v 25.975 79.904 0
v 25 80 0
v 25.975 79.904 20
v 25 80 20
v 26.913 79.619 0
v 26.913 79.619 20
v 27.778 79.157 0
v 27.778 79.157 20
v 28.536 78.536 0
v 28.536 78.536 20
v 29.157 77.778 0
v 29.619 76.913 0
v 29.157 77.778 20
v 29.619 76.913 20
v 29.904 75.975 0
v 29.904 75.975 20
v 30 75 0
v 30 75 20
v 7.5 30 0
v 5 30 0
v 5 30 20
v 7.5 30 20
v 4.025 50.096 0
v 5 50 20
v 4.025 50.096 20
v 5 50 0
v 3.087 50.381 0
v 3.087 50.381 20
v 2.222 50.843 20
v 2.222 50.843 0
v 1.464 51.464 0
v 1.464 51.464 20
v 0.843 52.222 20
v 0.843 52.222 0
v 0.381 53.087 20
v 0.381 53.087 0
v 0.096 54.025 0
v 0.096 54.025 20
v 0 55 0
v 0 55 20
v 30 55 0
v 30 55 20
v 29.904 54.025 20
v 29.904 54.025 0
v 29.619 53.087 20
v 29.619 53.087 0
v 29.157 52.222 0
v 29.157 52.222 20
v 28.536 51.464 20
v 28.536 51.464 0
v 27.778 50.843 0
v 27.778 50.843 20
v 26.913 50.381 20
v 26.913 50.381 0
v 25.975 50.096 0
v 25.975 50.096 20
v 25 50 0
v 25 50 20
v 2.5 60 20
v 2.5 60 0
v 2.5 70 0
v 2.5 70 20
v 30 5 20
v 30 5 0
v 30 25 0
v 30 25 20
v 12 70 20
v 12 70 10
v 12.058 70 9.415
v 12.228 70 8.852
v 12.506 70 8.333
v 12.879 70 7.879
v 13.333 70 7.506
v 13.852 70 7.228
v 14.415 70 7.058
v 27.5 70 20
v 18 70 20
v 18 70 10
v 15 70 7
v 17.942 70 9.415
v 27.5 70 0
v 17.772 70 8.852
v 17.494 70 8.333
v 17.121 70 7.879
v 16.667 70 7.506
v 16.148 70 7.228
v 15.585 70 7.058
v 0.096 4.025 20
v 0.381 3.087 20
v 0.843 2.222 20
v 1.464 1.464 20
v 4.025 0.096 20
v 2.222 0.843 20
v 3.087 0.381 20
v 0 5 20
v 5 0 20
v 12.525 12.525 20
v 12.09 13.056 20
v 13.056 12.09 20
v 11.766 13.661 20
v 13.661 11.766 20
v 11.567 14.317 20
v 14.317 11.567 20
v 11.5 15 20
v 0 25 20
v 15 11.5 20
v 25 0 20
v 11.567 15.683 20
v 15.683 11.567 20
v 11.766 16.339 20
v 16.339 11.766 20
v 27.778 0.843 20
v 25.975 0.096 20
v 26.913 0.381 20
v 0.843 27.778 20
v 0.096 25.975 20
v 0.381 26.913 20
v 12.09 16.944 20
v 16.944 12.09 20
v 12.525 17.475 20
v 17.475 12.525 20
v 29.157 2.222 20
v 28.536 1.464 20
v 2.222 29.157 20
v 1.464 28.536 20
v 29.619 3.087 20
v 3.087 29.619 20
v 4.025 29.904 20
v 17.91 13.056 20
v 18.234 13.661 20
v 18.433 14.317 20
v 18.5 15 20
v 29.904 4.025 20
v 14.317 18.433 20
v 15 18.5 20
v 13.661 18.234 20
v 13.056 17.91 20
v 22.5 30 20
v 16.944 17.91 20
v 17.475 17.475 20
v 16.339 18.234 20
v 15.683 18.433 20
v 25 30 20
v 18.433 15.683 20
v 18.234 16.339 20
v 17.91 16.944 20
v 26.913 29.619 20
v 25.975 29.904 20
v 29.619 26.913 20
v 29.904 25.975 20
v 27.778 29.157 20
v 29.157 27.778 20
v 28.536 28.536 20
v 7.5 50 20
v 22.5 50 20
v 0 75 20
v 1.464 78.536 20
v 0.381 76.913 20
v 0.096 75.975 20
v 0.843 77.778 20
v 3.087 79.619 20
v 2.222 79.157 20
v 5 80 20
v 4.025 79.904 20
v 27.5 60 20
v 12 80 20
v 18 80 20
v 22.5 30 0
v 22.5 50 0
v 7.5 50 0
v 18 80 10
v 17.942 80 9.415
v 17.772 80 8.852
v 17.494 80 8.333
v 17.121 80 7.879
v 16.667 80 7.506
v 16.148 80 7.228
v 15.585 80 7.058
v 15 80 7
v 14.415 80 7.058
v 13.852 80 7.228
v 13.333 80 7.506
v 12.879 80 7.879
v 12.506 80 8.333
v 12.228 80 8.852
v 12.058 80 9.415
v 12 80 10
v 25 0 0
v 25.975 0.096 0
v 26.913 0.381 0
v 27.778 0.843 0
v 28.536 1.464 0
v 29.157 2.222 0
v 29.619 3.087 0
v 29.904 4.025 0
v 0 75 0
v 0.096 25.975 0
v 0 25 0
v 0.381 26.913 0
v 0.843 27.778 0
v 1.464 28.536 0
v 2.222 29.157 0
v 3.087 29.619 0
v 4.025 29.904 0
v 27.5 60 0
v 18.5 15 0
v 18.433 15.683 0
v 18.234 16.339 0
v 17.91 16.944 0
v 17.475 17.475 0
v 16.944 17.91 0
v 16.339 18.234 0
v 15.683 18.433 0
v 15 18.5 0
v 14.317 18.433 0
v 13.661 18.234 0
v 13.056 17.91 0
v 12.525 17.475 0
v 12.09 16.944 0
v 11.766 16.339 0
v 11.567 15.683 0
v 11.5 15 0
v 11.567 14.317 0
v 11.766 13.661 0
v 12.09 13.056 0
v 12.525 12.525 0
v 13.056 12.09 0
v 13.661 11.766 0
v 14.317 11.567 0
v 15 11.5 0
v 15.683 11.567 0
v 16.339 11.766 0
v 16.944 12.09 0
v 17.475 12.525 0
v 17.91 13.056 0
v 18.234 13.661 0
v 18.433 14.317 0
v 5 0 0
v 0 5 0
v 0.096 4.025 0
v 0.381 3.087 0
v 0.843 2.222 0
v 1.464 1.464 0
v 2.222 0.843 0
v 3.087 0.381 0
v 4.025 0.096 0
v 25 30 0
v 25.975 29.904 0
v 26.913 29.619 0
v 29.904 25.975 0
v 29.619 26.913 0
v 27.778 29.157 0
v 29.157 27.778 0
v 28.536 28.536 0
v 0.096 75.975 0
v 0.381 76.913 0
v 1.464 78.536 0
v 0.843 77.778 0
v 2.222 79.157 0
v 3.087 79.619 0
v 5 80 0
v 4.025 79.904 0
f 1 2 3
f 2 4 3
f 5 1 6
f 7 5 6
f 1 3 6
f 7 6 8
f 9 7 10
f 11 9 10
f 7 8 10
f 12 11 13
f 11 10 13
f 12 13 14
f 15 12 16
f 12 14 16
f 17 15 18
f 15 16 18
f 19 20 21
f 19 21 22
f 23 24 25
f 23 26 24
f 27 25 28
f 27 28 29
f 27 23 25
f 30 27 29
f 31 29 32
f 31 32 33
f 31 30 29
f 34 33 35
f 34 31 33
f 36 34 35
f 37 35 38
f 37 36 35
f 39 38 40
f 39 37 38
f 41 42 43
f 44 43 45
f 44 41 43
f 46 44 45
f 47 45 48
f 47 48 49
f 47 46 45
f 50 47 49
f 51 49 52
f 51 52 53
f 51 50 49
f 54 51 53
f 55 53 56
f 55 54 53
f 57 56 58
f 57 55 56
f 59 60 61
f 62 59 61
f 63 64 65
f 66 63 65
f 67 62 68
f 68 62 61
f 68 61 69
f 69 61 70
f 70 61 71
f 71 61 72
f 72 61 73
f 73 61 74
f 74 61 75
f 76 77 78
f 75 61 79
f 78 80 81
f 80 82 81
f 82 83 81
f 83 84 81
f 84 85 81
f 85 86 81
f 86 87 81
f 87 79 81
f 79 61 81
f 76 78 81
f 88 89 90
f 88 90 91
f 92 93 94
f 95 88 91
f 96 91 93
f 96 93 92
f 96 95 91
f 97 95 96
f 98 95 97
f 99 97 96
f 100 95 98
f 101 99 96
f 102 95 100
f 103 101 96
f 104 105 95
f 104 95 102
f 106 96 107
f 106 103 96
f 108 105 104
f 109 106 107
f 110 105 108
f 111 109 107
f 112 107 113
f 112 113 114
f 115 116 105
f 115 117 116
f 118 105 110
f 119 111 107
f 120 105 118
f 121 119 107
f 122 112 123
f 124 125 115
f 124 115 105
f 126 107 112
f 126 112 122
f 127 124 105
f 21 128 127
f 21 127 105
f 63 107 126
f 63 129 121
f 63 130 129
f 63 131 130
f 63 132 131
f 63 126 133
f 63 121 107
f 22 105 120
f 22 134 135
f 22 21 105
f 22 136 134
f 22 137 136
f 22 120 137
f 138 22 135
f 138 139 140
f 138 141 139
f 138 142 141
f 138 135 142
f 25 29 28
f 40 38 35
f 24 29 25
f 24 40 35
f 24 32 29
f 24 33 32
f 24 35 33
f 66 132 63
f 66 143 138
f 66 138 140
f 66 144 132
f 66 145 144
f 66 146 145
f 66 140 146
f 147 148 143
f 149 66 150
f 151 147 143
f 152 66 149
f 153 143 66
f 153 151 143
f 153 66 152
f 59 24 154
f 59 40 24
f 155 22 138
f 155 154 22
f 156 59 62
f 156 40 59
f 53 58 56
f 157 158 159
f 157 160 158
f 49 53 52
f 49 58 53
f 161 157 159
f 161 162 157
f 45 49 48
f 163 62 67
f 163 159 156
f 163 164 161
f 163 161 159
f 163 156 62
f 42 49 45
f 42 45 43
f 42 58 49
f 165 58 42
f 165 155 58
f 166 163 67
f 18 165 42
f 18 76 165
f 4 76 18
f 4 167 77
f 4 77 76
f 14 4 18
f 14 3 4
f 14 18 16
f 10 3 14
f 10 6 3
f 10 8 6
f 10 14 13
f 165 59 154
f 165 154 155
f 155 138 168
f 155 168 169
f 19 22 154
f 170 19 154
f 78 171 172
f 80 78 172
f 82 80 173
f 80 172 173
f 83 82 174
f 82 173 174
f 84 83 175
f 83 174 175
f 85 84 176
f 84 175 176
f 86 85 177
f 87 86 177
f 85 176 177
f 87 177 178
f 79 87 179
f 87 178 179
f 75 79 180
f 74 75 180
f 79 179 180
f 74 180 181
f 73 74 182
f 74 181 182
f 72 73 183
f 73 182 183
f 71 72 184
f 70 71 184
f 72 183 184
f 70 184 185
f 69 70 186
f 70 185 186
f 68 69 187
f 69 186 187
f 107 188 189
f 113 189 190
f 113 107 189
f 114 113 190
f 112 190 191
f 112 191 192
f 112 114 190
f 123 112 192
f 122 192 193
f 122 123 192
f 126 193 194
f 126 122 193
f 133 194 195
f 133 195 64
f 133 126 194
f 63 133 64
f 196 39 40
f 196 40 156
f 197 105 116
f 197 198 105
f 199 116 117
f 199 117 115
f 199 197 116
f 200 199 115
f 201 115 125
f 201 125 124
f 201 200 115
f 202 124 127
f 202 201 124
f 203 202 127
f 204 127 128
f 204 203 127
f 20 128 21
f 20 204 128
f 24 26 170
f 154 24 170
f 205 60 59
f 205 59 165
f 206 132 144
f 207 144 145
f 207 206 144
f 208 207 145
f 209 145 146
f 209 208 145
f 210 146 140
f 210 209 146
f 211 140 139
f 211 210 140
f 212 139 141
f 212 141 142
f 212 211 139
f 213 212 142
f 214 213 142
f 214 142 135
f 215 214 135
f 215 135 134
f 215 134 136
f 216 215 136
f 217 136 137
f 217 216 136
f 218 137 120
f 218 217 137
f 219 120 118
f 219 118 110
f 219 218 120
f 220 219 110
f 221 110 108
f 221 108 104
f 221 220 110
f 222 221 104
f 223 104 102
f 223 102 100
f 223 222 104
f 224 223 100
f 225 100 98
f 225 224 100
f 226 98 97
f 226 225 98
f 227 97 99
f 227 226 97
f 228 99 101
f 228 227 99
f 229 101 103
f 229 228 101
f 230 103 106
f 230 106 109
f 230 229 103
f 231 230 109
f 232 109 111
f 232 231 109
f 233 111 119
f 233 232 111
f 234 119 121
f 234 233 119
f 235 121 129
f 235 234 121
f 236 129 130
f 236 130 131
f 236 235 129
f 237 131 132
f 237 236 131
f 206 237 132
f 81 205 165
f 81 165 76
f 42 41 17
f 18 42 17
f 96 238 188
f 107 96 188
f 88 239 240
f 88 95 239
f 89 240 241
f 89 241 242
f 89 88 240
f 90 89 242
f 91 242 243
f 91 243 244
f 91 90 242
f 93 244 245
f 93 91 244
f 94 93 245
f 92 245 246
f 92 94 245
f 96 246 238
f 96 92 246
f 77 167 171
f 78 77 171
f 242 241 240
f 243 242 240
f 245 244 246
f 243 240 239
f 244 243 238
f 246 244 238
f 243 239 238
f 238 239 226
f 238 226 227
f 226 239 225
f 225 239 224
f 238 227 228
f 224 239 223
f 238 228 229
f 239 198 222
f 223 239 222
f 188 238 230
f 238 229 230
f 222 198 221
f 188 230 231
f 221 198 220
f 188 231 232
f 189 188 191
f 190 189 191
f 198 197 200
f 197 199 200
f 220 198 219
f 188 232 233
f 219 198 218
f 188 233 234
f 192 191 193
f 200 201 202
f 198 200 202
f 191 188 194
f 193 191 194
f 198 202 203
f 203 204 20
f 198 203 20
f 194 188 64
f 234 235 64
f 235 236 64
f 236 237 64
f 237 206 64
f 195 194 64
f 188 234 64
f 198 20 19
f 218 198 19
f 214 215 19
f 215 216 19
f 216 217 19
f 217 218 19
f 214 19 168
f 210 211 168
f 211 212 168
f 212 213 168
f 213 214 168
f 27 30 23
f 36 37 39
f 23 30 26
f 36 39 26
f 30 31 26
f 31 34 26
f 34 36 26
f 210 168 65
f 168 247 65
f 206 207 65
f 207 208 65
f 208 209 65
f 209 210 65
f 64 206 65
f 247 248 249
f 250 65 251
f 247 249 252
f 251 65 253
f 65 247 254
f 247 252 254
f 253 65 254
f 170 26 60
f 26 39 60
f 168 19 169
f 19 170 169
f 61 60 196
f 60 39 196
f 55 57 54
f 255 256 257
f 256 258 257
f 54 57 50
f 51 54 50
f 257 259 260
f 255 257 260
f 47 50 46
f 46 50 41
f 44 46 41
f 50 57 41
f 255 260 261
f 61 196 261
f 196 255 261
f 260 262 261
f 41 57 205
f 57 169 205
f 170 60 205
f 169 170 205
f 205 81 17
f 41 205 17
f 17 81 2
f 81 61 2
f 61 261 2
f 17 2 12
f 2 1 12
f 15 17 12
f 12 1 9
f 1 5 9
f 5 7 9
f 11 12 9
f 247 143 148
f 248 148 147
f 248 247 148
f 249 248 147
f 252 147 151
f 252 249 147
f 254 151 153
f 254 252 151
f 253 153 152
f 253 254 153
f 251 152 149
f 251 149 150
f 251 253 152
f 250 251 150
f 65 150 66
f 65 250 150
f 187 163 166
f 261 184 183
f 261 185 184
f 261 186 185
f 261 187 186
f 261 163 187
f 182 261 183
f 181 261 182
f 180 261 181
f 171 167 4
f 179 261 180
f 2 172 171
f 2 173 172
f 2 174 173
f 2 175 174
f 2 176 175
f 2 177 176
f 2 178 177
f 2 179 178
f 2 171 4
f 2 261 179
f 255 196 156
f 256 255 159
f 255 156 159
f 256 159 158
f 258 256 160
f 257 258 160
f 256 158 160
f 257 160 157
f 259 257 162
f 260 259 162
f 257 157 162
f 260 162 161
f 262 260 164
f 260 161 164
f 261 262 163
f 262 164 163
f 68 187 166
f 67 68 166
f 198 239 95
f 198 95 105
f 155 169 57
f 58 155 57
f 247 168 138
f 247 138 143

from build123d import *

# Parameters (mm, degrees)
F0_W     = 30
F0_H     = 80
F1_DEPTH = 20
F2_R     = 3.5
F3_DEPTH = 20
F4_W     = 25
F4_H     = 10
F5_DEPTH = 20
F7_DEPTH = 20
F8_W     = 7.5
F8_H     = 20
F9_DEPTH = 20
F10_R    = 5
F11_R    = 5


with BuildPart() as f1:
    # F0 (on Top) → F1 (new body)
    with BuildSketch(Plane.XY):
        with Locations((15, 40)):
            Rectangle(F0_W, F0_H)
    extrude(amount=F1_DEPTH)

    # F2 (on Top) → F3 (cut)
    with BuildSketch(Plane.XY):
        with Locations((15, 15)):
            Circle(F2_R)
    extrude(amount=F3_DEPTH, mode=Mode.SUBTRACT)

    # F4 (on Top) → F5 (cut)
    with BuildSketch(Plane.XY):
        with Locations((15, 65)):
            Rectangle(F4_W, F4_H)
    extrude(amount=F5_DEPTH, mode=Mode.SUBTRACT)

    # F6 (on face) → F7 (cut)
    with BuildSketch(Plane(origin=(0, 80, 0), x_dir=(-1, 0, 0), z_dir=(0, 1, 0))):
        with BuildLine():
            ThreePointArc((-12, 10), (-15, 13), (-18, 10))
            Line((-18, 10), (-12, 10))
        make_face()
        with BuildLine():
            Line((-18, 20), (-18, 10))
            ThreePointArc((-18, 10), (-15, 13), (-12, 10))
            Line((-12, 10), (-12, 20))
            Line((-12, 20), (-18, 20))
        make_face()
        with BuildLine():
            Line((-12, 10), (-18, 10))
            ThreePointArc((-18, 10), (-15, 7), (-12, 10))
        make_face()
    extrude(amount=-F7_DEPTH, mode=Mode.SUBTRACT)

    # F8 (on face) → F9 (cut)
    with BuildSketch(Plane.XY.offset(20)):
        with Locations((26.25, 40)):
            Rectangle(F8_W, F8_H)
        with Locations((3.75, 40)):
            Rectangle(F8_W, F8_H)
    extrude(amount=-F9_DEPTH, mode=Mode.SUBTRACT)

    # F10
    f10_edges = [f1.edges().sort_by_distance(p)[0] for p in [
        (30, 30, 10),
        (0, 30, 10),
        (0, 0, 10),
        (30, 0, 10),
    ]]
    fillet(f10_edges, radius=F10_R)

    # F11
    f11_edges = [f1.edges().sort_by_distance(p)[0] for p in [
        (0, 80, 10),
        (0, 50, 10),
        (30, 50, 10),
        (30, 80, 10),
    ]]
    fillet(f11_edges, radius=F11_R)


solid = f1.part
